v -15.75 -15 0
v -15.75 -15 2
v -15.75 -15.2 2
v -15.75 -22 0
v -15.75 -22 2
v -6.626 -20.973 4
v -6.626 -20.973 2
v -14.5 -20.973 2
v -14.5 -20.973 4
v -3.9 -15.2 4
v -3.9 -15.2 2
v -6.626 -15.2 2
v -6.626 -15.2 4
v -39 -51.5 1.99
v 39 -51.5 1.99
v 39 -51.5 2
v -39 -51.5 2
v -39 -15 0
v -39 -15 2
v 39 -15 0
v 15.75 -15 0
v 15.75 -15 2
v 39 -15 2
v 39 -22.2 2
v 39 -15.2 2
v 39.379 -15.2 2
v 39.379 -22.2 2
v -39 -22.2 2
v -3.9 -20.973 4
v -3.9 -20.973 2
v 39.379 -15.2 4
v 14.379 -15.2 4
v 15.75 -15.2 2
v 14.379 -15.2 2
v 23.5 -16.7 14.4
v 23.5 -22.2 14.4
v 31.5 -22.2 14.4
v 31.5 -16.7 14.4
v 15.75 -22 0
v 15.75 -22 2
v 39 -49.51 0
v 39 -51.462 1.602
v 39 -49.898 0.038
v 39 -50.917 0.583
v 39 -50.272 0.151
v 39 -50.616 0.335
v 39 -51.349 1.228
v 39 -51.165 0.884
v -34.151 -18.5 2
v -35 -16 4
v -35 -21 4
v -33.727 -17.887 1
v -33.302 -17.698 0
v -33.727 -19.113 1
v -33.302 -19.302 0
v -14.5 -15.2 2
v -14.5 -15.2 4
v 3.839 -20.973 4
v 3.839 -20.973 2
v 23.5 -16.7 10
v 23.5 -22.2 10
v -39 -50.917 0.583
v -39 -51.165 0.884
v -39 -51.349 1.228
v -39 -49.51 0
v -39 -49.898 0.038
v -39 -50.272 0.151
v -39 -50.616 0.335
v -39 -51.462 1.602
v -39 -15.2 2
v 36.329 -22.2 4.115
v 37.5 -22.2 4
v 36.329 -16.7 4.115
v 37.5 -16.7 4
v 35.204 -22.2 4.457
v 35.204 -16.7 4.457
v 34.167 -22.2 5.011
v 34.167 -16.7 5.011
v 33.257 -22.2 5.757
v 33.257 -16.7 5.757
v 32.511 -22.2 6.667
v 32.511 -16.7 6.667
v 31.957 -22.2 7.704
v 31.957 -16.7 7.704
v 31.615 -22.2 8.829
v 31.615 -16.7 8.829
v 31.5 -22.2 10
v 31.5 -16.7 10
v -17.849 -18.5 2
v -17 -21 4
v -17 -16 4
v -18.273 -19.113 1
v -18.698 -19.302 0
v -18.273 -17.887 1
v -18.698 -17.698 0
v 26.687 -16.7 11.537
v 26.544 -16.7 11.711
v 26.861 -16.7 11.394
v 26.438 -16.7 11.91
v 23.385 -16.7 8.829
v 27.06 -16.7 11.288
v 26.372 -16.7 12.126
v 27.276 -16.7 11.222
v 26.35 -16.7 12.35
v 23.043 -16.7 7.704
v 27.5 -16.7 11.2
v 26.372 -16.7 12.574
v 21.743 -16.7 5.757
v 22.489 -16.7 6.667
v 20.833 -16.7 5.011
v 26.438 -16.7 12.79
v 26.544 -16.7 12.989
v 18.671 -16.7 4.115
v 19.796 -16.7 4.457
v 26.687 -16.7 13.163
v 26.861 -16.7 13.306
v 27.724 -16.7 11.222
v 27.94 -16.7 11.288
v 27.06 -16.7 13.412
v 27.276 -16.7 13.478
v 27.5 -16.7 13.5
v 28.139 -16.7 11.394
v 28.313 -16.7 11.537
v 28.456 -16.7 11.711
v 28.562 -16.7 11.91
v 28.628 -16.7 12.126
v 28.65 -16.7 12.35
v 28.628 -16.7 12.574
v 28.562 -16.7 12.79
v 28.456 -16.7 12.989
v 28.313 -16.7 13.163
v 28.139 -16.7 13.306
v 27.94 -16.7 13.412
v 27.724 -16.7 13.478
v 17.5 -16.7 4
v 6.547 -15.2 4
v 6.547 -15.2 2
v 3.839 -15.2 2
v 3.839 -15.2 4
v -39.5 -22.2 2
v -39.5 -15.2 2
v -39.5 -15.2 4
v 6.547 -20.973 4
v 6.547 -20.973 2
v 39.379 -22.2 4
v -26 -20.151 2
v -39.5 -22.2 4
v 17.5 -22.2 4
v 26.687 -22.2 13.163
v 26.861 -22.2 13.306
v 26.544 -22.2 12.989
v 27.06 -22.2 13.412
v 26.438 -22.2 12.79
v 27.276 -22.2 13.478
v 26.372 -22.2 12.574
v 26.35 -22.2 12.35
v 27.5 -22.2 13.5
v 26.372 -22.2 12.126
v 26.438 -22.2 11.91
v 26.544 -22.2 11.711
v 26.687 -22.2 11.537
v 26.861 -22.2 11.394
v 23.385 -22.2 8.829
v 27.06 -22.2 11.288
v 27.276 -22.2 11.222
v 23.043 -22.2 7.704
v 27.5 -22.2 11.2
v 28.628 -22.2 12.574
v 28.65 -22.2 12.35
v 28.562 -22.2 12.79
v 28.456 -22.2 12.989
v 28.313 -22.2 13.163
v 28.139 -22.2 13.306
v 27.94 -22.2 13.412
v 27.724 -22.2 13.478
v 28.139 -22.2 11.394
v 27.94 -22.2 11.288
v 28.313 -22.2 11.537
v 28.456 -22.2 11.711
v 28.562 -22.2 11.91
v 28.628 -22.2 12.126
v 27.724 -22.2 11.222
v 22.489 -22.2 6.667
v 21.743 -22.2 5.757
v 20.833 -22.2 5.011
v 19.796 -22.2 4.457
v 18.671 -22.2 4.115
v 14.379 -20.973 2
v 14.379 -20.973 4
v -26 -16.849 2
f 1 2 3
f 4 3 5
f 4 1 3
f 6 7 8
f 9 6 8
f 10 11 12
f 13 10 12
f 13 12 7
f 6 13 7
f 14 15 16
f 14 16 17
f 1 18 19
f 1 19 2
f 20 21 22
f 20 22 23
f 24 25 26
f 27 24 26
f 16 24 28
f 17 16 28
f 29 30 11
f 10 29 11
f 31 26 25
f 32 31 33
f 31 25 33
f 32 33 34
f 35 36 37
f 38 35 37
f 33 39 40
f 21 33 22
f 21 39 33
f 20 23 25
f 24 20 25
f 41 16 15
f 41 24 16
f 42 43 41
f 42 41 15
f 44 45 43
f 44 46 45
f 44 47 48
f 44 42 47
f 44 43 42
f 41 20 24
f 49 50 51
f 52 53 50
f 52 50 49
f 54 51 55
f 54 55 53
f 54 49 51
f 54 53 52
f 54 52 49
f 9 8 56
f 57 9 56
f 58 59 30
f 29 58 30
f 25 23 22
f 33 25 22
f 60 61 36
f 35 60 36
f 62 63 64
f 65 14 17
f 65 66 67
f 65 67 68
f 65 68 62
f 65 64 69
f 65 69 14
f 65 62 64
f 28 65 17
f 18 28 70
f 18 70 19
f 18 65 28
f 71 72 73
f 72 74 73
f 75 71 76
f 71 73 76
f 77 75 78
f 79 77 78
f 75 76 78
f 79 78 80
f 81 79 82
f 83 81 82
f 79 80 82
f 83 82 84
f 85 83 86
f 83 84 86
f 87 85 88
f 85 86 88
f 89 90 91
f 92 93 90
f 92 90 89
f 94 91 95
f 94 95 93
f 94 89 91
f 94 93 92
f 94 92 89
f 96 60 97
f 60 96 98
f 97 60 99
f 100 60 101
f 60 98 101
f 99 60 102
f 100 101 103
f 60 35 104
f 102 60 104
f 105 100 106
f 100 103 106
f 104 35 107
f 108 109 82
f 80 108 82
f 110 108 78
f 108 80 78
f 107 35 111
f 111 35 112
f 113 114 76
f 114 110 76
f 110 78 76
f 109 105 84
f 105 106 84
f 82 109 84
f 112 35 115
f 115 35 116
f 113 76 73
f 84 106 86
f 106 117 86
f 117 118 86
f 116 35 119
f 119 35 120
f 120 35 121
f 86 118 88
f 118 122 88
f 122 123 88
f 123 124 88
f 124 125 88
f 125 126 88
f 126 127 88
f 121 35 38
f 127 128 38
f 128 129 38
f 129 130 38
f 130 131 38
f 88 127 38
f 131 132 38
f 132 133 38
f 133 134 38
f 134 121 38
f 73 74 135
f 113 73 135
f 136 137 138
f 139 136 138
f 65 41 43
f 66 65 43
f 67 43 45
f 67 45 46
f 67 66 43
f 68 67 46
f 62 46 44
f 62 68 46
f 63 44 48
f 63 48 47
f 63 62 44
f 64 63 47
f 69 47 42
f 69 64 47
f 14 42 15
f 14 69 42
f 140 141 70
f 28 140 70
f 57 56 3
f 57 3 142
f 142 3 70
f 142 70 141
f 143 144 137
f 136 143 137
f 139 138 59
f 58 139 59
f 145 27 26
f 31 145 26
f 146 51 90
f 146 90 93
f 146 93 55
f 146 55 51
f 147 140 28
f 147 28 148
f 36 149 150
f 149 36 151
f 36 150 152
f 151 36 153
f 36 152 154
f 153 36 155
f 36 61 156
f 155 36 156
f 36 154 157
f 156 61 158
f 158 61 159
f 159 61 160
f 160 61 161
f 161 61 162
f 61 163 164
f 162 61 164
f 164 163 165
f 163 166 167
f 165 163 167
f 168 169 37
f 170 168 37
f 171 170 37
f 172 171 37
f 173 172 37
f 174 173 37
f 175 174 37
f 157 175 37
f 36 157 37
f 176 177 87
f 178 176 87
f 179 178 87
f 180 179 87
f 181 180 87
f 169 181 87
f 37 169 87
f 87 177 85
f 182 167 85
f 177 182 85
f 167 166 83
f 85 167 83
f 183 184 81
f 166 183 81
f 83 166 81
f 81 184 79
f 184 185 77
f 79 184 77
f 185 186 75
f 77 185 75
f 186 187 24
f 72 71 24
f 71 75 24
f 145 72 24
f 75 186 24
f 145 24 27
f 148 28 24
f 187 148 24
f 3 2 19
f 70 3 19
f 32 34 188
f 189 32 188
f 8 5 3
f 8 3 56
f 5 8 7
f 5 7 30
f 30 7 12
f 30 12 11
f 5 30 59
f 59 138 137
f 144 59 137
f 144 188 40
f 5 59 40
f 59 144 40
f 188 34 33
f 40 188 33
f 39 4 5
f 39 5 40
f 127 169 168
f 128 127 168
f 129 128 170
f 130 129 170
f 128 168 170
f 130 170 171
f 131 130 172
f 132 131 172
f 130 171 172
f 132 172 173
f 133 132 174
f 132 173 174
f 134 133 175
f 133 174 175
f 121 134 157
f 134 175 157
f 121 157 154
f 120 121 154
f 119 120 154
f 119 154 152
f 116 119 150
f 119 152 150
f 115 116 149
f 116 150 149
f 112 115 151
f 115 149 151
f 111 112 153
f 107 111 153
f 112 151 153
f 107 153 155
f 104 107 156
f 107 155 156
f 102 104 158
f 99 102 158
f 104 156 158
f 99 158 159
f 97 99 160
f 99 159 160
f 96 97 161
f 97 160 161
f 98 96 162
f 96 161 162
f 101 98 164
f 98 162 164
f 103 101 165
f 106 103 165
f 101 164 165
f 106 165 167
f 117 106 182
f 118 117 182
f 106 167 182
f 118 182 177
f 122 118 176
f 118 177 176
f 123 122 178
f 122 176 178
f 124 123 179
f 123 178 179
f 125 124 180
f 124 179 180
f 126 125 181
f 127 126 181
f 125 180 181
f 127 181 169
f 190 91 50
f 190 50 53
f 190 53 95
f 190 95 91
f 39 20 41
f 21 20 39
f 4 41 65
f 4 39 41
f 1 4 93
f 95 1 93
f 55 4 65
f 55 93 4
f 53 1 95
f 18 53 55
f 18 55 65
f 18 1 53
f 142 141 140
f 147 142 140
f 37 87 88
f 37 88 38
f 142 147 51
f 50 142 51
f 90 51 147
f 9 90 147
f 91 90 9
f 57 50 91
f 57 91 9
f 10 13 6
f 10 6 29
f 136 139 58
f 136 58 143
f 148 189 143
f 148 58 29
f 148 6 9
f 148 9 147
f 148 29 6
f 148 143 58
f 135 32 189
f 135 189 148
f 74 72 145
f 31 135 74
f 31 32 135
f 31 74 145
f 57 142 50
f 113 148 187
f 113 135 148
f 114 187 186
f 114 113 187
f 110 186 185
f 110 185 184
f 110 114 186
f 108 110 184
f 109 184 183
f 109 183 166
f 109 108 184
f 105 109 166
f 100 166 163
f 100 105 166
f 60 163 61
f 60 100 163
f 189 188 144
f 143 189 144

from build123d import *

# Parameters (mm, degrees)
PAD010_DEPTH    = 2
PAD013_DEPTH    = 2
SKETCH021_W     = 8
SKETCH021_H     = 11
SKETCH021_R     = 1.15
PAD014_DEPTH    = 5.5
FILLET003_R     = 6
FILLET006_R     = 1.99
SKETCH025_W     = 18
SKETCH025_H     = 5
POCKET008_DEPTH = 4
POCKET008_TAPER = 23


with BuildPart() as part:
    # Sketch014 → Pad010 (new body)
    with BuildSketch(Plane.XY):
        Polygon((-39, -15), (-15.75, -15), (-15.75, -22), (15.75, -22), (15.75, -15), (39, -15), (39, -51.5), (-39, -51.5), align=None)
    extrude(amount=PAD010_DEPTH)

    # Sketch020 (on Face10 of Pad010) → Pad013 (join)
    with BuildSketch(Plane.XY.offset(2)):
        Polygon((-14.5, -15.2), (-39.5, -15.2), (-39.5, -22.2), (39.378634, -22.2), (39.378634, -15.2), (14.378634, -15.2), (14.378634, -20.97266), (6.547439, -20.97266), (6.547439, -15.2), (3.839445, -15.2), (3.839445, -20.97266), (-3.90018, -20.97266), (-3.90018, -15.2), (-6.625733, -15.2), (-6.625733, -20.97266), (-14.5, -20.97266), align=None)
    extrude(amount=PAD013_DEPTH)

    # Sketch021 (on Face15 of Pad013) → Pad014 (join)
    with BuildSketch(Plane.XZ.offset(22.2)):
        with Locations((27.5, 8.9)):
            Rectangle(SKETCH021_W, SKETCH021_H)
        with Locations((27.5, 12.35)):
            Circle(SKETCH021_R, mode=Mode.SUBTRACT)
    extrude(amount=-PAD014_DEPTH)

    # Fillet003
    fillet003_edges = [part.edges().sort_by_distance(p)[0] for p in [
        (23.5, -19.45, 4),
        (31.5, -19.45, 4),
    ]]
    fillet(fillet003_edges, radius=FILLET003_R)

    # Fillet006
    fillet006_edges = [part.edges().sort_by_distance(p)[0] for p in [
        (0, -51.5, 0),
    ]]
    fillet(fillet006_edges, radius=FILLET006_R)

    # Sketch025 (on Face19 of Fillet006) → Pocket008 (cut)
    with BuildSketch(Plane.XY.offset(4)):
        with Locations((-26, -18.5)):
            Rectangle(SKETCH025_W, SKETCH025_H)
    extrude(amount=-POCKET008_DEPTH, taper=POCKET008_TAPER, mode=Mode.SUBTRACT)


solid = part.part
